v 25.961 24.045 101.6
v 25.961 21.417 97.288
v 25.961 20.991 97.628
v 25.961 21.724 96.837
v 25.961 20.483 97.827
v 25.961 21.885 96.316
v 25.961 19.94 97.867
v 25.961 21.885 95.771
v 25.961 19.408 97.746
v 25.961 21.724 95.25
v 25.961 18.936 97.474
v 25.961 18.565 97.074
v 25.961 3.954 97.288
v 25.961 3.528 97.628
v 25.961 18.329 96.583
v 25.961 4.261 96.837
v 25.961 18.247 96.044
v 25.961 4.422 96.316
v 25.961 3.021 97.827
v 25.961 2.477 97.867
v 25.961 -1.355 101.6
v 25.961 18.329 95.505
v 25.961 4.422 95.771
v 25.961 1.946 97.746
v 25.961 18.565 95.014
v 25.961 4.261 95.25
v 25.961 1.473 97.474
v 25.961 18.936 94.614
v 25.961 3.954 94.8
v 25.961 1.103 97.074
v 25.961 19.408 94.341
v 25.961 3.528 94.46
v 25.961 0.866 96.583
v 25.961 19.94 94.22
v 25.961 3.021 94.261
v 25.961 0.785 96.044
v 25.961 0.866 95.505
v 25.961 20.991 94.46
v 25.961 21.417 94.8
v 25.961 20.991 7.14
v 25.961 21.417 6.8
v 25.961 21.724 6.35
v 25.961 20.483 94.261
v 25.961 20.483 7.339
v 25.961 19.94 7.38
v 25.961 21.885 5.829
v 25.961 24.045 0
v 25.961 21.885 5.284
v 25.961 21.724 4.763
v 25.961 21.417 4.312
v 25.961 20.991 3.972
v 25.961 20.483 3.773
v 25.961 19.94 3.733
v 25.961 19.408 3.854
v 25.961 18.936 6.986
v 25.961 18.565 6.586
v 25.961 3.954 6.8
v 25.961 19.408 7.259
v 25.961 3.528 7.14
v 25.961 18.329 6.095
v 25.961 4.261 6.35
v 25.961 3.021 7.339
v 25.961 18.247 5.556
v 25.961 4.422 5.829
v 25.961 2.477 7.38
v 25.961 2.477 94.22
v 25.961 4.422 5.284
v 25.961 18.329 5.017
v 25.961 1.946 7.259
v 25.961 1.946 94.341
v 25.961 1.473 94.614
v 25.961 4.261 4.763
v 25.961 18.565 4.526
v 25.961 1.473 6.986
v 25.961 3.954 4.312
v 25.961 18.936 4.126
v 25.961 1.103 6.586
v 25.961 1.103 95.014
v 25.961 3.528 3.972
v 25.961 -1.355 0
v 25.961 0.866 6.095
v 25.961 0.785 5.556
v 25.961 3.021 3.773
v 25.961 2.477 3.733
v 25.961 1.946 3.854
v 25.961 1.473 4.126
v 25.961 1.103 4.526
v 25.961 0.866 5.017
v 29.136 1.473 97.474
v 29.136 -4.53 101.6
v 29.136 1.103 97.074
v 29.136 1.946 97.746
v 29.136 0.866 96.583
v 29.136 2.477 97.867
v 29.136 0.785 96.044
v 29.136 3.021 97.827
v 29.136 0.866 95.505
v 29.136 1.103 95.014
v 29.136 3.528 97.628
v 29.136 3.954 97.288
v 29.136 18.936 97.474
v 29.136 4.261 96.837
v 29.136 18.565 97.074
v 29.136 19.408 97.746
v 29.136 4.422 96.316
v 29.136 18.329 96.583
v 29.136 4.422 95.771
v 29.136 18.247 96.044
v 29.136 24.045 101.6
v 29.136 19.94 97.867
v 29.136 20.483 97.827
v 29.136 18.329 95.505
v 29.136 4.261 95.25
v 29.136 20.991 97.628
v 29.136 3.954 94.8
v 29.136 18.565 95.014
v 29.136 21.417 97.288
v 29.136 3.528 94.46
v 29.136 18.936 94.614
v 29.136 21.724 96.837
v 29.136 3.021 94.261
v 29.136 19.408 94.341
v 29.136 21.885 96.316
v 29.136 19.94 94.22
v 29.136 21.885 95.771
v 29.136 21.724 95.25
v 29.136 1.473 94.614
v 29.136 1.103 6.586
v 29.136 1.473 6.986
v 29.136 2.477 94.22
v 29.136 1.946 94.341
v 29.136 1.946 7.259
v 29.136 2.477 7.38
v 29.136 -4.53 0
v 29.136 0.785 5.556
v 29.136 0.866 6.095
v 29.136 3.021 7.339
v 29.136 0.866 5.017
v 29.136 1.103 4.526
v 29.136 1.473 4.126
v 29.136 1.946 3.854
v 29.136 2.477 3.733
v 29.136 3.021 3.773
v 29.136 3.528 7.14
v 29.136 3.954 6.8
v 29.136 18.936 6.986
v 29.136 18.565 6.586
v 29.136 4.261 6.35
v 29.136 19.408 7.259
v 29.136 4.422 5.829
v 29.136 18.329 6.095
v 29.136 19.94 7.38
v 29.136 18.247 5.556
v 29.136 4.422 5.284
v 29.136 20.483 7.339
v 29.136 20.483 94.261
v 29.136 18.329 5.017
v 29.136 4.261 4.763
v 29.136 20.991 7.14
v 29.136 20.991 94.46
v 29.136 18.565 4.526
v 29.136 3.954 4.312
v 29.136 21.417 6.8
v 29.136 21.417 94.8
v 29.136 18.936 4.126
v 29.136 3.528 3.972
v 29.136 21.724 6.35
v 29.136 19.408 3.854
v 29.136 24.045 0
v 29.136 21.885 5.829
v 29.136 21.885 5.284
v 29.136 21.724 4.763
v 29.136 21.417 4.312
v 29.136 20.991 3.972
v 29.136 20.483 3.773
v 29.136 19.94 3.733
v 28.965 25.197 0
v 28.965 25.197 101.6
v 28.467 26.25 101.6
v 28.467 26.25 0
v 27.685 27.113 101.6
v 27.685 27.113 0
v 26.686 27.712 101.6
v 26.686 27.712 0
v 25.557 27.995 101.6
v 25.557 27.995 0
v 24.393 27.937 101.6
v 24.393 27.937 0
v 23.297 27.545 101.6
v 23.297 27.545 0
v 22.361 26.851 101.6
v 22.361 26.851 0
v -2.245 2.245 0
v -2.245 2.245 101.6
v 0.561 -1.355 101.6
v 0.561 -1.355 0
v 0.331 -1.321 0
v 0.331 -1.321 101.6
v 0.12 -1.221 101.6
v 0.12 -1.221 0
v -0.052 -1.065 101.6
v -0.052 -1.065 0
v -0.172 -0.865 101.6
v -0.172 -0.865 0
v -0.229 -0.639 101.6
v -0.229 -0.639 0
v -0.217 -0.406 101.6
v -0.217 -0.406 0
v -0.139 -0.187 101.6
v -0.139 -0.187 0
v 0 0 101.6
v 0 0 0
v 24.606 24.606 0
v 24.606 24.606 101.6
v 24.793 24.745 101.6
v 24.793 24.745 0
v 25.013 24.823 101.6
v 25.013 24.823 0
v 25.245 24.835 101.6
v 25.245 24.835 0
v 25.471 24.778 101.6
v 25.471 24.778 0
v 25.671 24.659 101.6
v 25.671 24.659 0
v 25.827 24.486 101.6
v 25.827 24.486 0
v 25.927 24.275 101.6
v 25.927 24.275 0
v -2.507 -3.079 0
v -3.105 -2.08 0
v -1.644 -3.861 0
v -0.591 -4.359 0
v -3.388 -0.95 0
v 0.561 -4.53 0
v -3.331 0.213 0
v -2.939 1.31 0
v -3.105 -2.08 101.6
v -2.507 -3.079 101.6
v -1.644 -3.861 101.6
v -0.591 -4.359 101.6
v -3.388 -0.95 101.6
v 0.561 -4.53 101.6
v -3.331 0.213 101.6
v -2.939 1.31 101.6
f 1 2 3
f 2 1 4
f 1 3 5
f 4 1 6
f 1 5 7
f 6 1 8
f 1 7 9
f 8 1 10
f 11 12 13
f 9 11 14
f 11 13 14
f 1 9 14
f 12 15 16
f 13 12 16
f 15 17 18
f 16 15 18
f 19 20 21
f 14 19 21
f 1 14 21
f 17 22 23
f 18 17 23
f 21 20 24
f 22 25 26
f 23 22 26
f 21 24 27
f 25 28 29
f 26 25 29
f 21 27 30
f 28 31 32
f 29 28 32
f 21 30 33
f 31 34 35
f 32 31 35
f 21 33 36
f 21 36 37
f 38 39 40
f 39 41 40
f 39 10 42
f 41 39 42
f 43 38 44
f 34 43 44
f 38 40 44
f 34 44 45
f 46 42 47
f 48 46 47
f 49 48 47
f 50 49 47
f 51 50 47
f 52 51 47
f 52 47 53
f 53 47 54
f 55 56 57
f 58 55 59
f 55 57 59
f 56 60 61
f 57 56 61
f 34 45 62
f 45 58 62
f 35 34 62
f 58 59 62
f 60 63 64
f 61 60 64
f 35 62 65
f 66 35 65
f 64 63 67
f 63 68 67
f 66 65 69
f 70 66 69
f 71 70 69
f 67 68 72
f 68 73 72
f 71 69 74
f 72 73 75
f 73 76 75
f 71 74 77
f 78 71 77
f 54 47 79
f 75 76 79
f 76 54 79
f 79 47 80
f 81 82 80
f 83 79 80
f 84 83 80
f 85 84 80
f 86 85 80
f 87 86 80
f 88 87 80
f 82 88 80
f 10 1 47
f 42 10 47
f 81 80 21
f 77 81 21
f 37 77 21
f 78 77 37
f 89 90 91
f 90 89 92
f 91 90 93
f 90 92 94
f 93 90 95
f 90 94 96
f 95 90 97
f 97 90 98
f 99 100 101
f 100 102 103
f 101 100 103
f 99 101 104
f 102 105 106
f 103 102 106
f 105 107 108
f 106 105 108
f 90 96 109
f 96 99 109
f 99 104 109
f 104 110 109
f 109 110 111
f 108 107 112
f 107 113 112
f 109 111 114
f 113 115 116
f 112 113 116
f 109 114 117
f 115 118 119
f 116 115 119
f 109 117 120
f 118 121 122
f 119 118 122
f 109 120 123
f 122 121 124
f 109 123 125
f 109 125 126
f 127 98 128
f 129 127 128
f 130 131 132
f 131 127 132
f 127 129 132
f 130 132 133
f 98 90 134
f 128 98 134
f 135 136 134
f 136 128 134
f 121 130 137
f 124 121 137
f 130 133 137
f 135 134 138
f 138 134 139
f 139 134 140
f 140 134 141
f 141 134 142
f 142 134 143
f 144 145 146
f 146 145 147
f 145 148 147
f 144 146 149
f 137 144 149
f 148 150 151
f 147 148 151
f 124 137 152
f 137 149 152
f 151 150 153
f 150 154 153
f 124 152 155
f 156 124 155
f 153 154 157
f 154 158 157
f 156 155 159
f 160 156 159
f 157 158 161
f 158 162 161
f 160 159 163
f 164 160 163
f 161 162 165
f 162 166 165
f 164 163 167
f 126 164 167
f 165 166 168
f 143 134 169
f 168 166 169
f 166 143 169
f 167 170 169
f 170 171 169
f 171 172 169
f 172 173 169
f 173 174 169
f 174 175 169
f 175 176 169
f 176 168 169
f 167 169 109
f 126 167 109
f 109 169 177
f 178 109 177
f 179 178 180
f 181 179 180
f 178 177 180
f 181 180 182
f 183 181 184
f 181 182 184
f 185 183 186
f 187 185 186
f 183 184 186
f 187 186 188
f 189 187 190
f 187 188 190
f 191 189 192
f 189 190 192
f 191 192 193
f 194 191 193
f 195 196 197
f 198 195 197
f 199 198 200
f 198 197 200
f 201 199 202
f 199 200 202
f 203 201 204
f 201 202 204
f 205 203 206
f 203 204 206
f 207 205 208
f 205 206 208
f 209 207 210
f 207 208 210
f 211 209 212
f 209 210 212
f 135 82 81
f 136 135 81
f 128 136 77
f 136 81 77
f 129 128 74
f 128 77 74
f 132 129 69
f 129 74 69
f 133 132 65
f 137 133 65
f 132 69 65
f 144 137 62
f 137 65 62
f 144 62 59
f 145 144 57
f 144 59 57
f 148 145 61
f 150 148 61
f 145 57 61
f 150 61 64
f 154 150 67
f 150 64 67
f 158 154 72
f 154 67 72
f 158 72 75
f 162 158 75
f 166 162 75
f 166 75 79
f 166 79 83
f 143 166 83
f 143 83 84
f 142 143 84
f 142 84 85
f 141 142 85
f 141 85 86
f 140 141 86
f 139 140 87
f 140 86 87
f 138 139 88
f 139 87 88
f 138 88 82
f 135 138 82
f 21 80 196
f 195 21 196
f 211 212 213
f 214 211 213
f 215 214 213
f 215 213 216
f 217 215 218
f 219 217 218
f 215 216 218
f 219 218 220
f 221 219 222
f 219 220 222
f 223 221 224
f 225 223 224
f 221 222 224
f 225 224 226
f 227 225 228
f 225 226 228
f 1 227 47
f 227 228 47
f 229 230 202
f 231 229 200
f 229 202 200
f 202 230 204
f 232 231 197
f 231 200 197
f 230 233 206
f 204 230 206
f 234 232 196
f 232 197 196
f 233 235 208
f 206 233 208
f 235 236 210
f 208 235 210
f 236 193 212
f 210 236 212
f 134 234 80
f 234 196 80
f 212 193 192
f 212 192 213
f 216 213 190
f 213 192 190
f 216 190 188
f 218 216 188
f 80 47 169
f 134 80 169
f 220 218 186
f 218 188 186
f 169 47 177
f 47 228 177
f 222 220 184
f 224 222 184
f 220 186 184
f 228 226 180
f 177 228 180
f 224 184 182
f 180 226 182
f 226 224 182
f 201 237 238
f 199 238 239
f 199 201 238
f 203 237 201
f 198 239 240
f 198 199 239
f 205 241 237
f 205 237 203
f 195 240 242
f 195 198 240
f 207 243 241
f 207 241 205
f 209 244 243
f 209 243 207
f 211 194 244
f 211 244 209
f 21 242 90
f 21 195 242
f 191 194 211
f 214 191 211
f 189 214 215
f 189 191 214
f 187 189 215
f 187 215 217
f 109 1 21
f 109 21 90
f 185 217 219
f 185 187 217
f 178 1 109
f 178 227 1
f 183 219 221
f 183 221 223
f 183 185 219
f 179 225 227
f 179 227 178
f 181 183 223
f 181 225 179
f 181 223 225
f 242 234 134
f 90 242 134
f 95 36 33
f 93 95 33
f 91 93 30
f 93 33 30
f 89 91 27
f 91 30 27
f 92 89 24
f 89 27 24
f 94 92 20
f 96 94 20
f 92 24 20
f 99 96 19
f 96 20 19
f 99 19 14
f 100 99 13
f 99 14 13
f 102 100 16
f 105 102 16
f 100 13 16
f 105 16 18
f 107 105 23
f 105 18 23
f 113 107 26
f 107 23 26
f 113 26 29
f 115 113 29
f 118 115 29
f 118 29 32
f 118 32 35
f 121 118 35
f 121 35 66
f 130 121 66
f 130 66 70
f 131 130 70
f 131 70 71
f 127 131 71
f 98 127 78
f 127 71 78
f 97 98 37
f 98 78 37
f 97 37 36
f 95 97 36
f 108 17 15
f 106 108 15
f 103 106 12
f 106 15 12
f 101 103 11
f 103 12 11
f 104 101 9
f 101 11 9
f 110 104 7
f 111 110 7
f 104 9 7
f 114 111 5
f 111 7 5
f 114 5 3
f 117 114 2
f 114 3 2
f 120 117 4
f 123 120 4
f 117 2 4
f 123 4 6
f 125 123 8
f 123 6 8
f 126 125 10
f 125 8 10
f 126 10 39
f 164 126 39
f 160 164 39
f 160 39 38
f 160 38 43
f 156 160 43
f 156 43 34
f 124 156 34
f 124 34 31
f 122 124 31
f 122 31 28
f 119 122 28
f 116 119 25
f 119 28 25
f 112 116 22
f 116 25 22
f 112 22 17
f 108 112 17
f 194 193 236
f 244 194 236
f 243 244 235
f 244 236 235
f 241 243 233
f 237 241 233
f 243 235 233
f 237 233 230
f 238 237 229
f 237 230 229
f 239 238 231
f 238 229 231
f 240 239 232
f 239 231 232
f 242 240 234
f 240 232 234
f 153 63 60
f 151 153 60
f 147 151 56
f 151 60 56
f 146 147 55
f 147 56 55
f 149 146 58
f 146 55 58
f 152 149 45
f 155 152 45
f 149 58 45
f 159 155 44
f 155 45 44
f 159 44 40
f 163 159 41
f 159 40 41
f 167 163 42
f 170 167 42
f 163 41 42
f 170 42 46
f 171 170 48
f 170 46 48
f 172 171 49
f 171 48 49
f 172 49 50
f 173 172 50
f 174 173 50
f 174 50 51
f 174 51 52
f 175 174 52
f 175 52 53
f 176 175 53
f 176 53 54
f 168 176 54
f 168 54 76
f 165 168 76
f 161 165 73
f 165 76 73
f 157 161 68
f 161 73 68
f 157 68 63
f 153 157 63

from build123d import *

# Parameters (mm, degrees)
F1_DEPTH = 101.6
F2_R     = 1.8288
F3_DEPTH = 3.175


with BuildPart() as f1:
    # F0 (on Top) → F1 (new body)
    with BuildSketch(Plane.XY):
        with BuildLine():
            Line((29.136266, -4.530016), (29.136266, 24.044984))
            ThreePointArc((29.136266, 24.044984), (26.686291, 27.711631), (22.361186, 26.851314))
            Line((22.361186, 26.851314), (-2.245064, 2.245064))
            ThreePointArc((-2.245064, 2.245064), (-3.105381, -2.080041), (0.561266, -4.530016))
            Line((0.561266, -4.530016), (29.136266, -4.530016))
        make_face()
        with BuildLine():
            Line((25.961266, -1.355016), (0.561266, -1.355016))
            ThreePointArc((0.561266, -1.355016), (-0.172063, -0.865021), (0, 0))
            Line((0, 0), (24.60625, 24.60625))
            ThreePointArc((24.60625, 24.60625), (25.471271, 24.778313), (25.961266, 24.044984))
            Line((25.961266, 24.044984), (25.961266, -1.355016))
        make_face(mode=Mode.SUBTRACT)
    extrude(amount=F1_DEPTH)

    # F2 (on face) → F3 (cut, through all)
    with BuildSketch(Plane(origin=(25.961266, 0, 0), x_dir=(0, -1, 0), z_dir=(-1, 0, 0))):
        with Locations((-20.076234, 5.55625)):
            Circle(F2_R)
        with Locations((-2.613734, 5.55625)):
            Circle(F2_R)
        with Locations((-2.613734, 96.04375)):
            Circle(F2_R)
        with Locations((-20.076234, 96.04375)):
            Circle(F2_R)
    extrude(amount=-F3_DEPTH, mode=Mode.SUBTRACT)


solid = f1.part
